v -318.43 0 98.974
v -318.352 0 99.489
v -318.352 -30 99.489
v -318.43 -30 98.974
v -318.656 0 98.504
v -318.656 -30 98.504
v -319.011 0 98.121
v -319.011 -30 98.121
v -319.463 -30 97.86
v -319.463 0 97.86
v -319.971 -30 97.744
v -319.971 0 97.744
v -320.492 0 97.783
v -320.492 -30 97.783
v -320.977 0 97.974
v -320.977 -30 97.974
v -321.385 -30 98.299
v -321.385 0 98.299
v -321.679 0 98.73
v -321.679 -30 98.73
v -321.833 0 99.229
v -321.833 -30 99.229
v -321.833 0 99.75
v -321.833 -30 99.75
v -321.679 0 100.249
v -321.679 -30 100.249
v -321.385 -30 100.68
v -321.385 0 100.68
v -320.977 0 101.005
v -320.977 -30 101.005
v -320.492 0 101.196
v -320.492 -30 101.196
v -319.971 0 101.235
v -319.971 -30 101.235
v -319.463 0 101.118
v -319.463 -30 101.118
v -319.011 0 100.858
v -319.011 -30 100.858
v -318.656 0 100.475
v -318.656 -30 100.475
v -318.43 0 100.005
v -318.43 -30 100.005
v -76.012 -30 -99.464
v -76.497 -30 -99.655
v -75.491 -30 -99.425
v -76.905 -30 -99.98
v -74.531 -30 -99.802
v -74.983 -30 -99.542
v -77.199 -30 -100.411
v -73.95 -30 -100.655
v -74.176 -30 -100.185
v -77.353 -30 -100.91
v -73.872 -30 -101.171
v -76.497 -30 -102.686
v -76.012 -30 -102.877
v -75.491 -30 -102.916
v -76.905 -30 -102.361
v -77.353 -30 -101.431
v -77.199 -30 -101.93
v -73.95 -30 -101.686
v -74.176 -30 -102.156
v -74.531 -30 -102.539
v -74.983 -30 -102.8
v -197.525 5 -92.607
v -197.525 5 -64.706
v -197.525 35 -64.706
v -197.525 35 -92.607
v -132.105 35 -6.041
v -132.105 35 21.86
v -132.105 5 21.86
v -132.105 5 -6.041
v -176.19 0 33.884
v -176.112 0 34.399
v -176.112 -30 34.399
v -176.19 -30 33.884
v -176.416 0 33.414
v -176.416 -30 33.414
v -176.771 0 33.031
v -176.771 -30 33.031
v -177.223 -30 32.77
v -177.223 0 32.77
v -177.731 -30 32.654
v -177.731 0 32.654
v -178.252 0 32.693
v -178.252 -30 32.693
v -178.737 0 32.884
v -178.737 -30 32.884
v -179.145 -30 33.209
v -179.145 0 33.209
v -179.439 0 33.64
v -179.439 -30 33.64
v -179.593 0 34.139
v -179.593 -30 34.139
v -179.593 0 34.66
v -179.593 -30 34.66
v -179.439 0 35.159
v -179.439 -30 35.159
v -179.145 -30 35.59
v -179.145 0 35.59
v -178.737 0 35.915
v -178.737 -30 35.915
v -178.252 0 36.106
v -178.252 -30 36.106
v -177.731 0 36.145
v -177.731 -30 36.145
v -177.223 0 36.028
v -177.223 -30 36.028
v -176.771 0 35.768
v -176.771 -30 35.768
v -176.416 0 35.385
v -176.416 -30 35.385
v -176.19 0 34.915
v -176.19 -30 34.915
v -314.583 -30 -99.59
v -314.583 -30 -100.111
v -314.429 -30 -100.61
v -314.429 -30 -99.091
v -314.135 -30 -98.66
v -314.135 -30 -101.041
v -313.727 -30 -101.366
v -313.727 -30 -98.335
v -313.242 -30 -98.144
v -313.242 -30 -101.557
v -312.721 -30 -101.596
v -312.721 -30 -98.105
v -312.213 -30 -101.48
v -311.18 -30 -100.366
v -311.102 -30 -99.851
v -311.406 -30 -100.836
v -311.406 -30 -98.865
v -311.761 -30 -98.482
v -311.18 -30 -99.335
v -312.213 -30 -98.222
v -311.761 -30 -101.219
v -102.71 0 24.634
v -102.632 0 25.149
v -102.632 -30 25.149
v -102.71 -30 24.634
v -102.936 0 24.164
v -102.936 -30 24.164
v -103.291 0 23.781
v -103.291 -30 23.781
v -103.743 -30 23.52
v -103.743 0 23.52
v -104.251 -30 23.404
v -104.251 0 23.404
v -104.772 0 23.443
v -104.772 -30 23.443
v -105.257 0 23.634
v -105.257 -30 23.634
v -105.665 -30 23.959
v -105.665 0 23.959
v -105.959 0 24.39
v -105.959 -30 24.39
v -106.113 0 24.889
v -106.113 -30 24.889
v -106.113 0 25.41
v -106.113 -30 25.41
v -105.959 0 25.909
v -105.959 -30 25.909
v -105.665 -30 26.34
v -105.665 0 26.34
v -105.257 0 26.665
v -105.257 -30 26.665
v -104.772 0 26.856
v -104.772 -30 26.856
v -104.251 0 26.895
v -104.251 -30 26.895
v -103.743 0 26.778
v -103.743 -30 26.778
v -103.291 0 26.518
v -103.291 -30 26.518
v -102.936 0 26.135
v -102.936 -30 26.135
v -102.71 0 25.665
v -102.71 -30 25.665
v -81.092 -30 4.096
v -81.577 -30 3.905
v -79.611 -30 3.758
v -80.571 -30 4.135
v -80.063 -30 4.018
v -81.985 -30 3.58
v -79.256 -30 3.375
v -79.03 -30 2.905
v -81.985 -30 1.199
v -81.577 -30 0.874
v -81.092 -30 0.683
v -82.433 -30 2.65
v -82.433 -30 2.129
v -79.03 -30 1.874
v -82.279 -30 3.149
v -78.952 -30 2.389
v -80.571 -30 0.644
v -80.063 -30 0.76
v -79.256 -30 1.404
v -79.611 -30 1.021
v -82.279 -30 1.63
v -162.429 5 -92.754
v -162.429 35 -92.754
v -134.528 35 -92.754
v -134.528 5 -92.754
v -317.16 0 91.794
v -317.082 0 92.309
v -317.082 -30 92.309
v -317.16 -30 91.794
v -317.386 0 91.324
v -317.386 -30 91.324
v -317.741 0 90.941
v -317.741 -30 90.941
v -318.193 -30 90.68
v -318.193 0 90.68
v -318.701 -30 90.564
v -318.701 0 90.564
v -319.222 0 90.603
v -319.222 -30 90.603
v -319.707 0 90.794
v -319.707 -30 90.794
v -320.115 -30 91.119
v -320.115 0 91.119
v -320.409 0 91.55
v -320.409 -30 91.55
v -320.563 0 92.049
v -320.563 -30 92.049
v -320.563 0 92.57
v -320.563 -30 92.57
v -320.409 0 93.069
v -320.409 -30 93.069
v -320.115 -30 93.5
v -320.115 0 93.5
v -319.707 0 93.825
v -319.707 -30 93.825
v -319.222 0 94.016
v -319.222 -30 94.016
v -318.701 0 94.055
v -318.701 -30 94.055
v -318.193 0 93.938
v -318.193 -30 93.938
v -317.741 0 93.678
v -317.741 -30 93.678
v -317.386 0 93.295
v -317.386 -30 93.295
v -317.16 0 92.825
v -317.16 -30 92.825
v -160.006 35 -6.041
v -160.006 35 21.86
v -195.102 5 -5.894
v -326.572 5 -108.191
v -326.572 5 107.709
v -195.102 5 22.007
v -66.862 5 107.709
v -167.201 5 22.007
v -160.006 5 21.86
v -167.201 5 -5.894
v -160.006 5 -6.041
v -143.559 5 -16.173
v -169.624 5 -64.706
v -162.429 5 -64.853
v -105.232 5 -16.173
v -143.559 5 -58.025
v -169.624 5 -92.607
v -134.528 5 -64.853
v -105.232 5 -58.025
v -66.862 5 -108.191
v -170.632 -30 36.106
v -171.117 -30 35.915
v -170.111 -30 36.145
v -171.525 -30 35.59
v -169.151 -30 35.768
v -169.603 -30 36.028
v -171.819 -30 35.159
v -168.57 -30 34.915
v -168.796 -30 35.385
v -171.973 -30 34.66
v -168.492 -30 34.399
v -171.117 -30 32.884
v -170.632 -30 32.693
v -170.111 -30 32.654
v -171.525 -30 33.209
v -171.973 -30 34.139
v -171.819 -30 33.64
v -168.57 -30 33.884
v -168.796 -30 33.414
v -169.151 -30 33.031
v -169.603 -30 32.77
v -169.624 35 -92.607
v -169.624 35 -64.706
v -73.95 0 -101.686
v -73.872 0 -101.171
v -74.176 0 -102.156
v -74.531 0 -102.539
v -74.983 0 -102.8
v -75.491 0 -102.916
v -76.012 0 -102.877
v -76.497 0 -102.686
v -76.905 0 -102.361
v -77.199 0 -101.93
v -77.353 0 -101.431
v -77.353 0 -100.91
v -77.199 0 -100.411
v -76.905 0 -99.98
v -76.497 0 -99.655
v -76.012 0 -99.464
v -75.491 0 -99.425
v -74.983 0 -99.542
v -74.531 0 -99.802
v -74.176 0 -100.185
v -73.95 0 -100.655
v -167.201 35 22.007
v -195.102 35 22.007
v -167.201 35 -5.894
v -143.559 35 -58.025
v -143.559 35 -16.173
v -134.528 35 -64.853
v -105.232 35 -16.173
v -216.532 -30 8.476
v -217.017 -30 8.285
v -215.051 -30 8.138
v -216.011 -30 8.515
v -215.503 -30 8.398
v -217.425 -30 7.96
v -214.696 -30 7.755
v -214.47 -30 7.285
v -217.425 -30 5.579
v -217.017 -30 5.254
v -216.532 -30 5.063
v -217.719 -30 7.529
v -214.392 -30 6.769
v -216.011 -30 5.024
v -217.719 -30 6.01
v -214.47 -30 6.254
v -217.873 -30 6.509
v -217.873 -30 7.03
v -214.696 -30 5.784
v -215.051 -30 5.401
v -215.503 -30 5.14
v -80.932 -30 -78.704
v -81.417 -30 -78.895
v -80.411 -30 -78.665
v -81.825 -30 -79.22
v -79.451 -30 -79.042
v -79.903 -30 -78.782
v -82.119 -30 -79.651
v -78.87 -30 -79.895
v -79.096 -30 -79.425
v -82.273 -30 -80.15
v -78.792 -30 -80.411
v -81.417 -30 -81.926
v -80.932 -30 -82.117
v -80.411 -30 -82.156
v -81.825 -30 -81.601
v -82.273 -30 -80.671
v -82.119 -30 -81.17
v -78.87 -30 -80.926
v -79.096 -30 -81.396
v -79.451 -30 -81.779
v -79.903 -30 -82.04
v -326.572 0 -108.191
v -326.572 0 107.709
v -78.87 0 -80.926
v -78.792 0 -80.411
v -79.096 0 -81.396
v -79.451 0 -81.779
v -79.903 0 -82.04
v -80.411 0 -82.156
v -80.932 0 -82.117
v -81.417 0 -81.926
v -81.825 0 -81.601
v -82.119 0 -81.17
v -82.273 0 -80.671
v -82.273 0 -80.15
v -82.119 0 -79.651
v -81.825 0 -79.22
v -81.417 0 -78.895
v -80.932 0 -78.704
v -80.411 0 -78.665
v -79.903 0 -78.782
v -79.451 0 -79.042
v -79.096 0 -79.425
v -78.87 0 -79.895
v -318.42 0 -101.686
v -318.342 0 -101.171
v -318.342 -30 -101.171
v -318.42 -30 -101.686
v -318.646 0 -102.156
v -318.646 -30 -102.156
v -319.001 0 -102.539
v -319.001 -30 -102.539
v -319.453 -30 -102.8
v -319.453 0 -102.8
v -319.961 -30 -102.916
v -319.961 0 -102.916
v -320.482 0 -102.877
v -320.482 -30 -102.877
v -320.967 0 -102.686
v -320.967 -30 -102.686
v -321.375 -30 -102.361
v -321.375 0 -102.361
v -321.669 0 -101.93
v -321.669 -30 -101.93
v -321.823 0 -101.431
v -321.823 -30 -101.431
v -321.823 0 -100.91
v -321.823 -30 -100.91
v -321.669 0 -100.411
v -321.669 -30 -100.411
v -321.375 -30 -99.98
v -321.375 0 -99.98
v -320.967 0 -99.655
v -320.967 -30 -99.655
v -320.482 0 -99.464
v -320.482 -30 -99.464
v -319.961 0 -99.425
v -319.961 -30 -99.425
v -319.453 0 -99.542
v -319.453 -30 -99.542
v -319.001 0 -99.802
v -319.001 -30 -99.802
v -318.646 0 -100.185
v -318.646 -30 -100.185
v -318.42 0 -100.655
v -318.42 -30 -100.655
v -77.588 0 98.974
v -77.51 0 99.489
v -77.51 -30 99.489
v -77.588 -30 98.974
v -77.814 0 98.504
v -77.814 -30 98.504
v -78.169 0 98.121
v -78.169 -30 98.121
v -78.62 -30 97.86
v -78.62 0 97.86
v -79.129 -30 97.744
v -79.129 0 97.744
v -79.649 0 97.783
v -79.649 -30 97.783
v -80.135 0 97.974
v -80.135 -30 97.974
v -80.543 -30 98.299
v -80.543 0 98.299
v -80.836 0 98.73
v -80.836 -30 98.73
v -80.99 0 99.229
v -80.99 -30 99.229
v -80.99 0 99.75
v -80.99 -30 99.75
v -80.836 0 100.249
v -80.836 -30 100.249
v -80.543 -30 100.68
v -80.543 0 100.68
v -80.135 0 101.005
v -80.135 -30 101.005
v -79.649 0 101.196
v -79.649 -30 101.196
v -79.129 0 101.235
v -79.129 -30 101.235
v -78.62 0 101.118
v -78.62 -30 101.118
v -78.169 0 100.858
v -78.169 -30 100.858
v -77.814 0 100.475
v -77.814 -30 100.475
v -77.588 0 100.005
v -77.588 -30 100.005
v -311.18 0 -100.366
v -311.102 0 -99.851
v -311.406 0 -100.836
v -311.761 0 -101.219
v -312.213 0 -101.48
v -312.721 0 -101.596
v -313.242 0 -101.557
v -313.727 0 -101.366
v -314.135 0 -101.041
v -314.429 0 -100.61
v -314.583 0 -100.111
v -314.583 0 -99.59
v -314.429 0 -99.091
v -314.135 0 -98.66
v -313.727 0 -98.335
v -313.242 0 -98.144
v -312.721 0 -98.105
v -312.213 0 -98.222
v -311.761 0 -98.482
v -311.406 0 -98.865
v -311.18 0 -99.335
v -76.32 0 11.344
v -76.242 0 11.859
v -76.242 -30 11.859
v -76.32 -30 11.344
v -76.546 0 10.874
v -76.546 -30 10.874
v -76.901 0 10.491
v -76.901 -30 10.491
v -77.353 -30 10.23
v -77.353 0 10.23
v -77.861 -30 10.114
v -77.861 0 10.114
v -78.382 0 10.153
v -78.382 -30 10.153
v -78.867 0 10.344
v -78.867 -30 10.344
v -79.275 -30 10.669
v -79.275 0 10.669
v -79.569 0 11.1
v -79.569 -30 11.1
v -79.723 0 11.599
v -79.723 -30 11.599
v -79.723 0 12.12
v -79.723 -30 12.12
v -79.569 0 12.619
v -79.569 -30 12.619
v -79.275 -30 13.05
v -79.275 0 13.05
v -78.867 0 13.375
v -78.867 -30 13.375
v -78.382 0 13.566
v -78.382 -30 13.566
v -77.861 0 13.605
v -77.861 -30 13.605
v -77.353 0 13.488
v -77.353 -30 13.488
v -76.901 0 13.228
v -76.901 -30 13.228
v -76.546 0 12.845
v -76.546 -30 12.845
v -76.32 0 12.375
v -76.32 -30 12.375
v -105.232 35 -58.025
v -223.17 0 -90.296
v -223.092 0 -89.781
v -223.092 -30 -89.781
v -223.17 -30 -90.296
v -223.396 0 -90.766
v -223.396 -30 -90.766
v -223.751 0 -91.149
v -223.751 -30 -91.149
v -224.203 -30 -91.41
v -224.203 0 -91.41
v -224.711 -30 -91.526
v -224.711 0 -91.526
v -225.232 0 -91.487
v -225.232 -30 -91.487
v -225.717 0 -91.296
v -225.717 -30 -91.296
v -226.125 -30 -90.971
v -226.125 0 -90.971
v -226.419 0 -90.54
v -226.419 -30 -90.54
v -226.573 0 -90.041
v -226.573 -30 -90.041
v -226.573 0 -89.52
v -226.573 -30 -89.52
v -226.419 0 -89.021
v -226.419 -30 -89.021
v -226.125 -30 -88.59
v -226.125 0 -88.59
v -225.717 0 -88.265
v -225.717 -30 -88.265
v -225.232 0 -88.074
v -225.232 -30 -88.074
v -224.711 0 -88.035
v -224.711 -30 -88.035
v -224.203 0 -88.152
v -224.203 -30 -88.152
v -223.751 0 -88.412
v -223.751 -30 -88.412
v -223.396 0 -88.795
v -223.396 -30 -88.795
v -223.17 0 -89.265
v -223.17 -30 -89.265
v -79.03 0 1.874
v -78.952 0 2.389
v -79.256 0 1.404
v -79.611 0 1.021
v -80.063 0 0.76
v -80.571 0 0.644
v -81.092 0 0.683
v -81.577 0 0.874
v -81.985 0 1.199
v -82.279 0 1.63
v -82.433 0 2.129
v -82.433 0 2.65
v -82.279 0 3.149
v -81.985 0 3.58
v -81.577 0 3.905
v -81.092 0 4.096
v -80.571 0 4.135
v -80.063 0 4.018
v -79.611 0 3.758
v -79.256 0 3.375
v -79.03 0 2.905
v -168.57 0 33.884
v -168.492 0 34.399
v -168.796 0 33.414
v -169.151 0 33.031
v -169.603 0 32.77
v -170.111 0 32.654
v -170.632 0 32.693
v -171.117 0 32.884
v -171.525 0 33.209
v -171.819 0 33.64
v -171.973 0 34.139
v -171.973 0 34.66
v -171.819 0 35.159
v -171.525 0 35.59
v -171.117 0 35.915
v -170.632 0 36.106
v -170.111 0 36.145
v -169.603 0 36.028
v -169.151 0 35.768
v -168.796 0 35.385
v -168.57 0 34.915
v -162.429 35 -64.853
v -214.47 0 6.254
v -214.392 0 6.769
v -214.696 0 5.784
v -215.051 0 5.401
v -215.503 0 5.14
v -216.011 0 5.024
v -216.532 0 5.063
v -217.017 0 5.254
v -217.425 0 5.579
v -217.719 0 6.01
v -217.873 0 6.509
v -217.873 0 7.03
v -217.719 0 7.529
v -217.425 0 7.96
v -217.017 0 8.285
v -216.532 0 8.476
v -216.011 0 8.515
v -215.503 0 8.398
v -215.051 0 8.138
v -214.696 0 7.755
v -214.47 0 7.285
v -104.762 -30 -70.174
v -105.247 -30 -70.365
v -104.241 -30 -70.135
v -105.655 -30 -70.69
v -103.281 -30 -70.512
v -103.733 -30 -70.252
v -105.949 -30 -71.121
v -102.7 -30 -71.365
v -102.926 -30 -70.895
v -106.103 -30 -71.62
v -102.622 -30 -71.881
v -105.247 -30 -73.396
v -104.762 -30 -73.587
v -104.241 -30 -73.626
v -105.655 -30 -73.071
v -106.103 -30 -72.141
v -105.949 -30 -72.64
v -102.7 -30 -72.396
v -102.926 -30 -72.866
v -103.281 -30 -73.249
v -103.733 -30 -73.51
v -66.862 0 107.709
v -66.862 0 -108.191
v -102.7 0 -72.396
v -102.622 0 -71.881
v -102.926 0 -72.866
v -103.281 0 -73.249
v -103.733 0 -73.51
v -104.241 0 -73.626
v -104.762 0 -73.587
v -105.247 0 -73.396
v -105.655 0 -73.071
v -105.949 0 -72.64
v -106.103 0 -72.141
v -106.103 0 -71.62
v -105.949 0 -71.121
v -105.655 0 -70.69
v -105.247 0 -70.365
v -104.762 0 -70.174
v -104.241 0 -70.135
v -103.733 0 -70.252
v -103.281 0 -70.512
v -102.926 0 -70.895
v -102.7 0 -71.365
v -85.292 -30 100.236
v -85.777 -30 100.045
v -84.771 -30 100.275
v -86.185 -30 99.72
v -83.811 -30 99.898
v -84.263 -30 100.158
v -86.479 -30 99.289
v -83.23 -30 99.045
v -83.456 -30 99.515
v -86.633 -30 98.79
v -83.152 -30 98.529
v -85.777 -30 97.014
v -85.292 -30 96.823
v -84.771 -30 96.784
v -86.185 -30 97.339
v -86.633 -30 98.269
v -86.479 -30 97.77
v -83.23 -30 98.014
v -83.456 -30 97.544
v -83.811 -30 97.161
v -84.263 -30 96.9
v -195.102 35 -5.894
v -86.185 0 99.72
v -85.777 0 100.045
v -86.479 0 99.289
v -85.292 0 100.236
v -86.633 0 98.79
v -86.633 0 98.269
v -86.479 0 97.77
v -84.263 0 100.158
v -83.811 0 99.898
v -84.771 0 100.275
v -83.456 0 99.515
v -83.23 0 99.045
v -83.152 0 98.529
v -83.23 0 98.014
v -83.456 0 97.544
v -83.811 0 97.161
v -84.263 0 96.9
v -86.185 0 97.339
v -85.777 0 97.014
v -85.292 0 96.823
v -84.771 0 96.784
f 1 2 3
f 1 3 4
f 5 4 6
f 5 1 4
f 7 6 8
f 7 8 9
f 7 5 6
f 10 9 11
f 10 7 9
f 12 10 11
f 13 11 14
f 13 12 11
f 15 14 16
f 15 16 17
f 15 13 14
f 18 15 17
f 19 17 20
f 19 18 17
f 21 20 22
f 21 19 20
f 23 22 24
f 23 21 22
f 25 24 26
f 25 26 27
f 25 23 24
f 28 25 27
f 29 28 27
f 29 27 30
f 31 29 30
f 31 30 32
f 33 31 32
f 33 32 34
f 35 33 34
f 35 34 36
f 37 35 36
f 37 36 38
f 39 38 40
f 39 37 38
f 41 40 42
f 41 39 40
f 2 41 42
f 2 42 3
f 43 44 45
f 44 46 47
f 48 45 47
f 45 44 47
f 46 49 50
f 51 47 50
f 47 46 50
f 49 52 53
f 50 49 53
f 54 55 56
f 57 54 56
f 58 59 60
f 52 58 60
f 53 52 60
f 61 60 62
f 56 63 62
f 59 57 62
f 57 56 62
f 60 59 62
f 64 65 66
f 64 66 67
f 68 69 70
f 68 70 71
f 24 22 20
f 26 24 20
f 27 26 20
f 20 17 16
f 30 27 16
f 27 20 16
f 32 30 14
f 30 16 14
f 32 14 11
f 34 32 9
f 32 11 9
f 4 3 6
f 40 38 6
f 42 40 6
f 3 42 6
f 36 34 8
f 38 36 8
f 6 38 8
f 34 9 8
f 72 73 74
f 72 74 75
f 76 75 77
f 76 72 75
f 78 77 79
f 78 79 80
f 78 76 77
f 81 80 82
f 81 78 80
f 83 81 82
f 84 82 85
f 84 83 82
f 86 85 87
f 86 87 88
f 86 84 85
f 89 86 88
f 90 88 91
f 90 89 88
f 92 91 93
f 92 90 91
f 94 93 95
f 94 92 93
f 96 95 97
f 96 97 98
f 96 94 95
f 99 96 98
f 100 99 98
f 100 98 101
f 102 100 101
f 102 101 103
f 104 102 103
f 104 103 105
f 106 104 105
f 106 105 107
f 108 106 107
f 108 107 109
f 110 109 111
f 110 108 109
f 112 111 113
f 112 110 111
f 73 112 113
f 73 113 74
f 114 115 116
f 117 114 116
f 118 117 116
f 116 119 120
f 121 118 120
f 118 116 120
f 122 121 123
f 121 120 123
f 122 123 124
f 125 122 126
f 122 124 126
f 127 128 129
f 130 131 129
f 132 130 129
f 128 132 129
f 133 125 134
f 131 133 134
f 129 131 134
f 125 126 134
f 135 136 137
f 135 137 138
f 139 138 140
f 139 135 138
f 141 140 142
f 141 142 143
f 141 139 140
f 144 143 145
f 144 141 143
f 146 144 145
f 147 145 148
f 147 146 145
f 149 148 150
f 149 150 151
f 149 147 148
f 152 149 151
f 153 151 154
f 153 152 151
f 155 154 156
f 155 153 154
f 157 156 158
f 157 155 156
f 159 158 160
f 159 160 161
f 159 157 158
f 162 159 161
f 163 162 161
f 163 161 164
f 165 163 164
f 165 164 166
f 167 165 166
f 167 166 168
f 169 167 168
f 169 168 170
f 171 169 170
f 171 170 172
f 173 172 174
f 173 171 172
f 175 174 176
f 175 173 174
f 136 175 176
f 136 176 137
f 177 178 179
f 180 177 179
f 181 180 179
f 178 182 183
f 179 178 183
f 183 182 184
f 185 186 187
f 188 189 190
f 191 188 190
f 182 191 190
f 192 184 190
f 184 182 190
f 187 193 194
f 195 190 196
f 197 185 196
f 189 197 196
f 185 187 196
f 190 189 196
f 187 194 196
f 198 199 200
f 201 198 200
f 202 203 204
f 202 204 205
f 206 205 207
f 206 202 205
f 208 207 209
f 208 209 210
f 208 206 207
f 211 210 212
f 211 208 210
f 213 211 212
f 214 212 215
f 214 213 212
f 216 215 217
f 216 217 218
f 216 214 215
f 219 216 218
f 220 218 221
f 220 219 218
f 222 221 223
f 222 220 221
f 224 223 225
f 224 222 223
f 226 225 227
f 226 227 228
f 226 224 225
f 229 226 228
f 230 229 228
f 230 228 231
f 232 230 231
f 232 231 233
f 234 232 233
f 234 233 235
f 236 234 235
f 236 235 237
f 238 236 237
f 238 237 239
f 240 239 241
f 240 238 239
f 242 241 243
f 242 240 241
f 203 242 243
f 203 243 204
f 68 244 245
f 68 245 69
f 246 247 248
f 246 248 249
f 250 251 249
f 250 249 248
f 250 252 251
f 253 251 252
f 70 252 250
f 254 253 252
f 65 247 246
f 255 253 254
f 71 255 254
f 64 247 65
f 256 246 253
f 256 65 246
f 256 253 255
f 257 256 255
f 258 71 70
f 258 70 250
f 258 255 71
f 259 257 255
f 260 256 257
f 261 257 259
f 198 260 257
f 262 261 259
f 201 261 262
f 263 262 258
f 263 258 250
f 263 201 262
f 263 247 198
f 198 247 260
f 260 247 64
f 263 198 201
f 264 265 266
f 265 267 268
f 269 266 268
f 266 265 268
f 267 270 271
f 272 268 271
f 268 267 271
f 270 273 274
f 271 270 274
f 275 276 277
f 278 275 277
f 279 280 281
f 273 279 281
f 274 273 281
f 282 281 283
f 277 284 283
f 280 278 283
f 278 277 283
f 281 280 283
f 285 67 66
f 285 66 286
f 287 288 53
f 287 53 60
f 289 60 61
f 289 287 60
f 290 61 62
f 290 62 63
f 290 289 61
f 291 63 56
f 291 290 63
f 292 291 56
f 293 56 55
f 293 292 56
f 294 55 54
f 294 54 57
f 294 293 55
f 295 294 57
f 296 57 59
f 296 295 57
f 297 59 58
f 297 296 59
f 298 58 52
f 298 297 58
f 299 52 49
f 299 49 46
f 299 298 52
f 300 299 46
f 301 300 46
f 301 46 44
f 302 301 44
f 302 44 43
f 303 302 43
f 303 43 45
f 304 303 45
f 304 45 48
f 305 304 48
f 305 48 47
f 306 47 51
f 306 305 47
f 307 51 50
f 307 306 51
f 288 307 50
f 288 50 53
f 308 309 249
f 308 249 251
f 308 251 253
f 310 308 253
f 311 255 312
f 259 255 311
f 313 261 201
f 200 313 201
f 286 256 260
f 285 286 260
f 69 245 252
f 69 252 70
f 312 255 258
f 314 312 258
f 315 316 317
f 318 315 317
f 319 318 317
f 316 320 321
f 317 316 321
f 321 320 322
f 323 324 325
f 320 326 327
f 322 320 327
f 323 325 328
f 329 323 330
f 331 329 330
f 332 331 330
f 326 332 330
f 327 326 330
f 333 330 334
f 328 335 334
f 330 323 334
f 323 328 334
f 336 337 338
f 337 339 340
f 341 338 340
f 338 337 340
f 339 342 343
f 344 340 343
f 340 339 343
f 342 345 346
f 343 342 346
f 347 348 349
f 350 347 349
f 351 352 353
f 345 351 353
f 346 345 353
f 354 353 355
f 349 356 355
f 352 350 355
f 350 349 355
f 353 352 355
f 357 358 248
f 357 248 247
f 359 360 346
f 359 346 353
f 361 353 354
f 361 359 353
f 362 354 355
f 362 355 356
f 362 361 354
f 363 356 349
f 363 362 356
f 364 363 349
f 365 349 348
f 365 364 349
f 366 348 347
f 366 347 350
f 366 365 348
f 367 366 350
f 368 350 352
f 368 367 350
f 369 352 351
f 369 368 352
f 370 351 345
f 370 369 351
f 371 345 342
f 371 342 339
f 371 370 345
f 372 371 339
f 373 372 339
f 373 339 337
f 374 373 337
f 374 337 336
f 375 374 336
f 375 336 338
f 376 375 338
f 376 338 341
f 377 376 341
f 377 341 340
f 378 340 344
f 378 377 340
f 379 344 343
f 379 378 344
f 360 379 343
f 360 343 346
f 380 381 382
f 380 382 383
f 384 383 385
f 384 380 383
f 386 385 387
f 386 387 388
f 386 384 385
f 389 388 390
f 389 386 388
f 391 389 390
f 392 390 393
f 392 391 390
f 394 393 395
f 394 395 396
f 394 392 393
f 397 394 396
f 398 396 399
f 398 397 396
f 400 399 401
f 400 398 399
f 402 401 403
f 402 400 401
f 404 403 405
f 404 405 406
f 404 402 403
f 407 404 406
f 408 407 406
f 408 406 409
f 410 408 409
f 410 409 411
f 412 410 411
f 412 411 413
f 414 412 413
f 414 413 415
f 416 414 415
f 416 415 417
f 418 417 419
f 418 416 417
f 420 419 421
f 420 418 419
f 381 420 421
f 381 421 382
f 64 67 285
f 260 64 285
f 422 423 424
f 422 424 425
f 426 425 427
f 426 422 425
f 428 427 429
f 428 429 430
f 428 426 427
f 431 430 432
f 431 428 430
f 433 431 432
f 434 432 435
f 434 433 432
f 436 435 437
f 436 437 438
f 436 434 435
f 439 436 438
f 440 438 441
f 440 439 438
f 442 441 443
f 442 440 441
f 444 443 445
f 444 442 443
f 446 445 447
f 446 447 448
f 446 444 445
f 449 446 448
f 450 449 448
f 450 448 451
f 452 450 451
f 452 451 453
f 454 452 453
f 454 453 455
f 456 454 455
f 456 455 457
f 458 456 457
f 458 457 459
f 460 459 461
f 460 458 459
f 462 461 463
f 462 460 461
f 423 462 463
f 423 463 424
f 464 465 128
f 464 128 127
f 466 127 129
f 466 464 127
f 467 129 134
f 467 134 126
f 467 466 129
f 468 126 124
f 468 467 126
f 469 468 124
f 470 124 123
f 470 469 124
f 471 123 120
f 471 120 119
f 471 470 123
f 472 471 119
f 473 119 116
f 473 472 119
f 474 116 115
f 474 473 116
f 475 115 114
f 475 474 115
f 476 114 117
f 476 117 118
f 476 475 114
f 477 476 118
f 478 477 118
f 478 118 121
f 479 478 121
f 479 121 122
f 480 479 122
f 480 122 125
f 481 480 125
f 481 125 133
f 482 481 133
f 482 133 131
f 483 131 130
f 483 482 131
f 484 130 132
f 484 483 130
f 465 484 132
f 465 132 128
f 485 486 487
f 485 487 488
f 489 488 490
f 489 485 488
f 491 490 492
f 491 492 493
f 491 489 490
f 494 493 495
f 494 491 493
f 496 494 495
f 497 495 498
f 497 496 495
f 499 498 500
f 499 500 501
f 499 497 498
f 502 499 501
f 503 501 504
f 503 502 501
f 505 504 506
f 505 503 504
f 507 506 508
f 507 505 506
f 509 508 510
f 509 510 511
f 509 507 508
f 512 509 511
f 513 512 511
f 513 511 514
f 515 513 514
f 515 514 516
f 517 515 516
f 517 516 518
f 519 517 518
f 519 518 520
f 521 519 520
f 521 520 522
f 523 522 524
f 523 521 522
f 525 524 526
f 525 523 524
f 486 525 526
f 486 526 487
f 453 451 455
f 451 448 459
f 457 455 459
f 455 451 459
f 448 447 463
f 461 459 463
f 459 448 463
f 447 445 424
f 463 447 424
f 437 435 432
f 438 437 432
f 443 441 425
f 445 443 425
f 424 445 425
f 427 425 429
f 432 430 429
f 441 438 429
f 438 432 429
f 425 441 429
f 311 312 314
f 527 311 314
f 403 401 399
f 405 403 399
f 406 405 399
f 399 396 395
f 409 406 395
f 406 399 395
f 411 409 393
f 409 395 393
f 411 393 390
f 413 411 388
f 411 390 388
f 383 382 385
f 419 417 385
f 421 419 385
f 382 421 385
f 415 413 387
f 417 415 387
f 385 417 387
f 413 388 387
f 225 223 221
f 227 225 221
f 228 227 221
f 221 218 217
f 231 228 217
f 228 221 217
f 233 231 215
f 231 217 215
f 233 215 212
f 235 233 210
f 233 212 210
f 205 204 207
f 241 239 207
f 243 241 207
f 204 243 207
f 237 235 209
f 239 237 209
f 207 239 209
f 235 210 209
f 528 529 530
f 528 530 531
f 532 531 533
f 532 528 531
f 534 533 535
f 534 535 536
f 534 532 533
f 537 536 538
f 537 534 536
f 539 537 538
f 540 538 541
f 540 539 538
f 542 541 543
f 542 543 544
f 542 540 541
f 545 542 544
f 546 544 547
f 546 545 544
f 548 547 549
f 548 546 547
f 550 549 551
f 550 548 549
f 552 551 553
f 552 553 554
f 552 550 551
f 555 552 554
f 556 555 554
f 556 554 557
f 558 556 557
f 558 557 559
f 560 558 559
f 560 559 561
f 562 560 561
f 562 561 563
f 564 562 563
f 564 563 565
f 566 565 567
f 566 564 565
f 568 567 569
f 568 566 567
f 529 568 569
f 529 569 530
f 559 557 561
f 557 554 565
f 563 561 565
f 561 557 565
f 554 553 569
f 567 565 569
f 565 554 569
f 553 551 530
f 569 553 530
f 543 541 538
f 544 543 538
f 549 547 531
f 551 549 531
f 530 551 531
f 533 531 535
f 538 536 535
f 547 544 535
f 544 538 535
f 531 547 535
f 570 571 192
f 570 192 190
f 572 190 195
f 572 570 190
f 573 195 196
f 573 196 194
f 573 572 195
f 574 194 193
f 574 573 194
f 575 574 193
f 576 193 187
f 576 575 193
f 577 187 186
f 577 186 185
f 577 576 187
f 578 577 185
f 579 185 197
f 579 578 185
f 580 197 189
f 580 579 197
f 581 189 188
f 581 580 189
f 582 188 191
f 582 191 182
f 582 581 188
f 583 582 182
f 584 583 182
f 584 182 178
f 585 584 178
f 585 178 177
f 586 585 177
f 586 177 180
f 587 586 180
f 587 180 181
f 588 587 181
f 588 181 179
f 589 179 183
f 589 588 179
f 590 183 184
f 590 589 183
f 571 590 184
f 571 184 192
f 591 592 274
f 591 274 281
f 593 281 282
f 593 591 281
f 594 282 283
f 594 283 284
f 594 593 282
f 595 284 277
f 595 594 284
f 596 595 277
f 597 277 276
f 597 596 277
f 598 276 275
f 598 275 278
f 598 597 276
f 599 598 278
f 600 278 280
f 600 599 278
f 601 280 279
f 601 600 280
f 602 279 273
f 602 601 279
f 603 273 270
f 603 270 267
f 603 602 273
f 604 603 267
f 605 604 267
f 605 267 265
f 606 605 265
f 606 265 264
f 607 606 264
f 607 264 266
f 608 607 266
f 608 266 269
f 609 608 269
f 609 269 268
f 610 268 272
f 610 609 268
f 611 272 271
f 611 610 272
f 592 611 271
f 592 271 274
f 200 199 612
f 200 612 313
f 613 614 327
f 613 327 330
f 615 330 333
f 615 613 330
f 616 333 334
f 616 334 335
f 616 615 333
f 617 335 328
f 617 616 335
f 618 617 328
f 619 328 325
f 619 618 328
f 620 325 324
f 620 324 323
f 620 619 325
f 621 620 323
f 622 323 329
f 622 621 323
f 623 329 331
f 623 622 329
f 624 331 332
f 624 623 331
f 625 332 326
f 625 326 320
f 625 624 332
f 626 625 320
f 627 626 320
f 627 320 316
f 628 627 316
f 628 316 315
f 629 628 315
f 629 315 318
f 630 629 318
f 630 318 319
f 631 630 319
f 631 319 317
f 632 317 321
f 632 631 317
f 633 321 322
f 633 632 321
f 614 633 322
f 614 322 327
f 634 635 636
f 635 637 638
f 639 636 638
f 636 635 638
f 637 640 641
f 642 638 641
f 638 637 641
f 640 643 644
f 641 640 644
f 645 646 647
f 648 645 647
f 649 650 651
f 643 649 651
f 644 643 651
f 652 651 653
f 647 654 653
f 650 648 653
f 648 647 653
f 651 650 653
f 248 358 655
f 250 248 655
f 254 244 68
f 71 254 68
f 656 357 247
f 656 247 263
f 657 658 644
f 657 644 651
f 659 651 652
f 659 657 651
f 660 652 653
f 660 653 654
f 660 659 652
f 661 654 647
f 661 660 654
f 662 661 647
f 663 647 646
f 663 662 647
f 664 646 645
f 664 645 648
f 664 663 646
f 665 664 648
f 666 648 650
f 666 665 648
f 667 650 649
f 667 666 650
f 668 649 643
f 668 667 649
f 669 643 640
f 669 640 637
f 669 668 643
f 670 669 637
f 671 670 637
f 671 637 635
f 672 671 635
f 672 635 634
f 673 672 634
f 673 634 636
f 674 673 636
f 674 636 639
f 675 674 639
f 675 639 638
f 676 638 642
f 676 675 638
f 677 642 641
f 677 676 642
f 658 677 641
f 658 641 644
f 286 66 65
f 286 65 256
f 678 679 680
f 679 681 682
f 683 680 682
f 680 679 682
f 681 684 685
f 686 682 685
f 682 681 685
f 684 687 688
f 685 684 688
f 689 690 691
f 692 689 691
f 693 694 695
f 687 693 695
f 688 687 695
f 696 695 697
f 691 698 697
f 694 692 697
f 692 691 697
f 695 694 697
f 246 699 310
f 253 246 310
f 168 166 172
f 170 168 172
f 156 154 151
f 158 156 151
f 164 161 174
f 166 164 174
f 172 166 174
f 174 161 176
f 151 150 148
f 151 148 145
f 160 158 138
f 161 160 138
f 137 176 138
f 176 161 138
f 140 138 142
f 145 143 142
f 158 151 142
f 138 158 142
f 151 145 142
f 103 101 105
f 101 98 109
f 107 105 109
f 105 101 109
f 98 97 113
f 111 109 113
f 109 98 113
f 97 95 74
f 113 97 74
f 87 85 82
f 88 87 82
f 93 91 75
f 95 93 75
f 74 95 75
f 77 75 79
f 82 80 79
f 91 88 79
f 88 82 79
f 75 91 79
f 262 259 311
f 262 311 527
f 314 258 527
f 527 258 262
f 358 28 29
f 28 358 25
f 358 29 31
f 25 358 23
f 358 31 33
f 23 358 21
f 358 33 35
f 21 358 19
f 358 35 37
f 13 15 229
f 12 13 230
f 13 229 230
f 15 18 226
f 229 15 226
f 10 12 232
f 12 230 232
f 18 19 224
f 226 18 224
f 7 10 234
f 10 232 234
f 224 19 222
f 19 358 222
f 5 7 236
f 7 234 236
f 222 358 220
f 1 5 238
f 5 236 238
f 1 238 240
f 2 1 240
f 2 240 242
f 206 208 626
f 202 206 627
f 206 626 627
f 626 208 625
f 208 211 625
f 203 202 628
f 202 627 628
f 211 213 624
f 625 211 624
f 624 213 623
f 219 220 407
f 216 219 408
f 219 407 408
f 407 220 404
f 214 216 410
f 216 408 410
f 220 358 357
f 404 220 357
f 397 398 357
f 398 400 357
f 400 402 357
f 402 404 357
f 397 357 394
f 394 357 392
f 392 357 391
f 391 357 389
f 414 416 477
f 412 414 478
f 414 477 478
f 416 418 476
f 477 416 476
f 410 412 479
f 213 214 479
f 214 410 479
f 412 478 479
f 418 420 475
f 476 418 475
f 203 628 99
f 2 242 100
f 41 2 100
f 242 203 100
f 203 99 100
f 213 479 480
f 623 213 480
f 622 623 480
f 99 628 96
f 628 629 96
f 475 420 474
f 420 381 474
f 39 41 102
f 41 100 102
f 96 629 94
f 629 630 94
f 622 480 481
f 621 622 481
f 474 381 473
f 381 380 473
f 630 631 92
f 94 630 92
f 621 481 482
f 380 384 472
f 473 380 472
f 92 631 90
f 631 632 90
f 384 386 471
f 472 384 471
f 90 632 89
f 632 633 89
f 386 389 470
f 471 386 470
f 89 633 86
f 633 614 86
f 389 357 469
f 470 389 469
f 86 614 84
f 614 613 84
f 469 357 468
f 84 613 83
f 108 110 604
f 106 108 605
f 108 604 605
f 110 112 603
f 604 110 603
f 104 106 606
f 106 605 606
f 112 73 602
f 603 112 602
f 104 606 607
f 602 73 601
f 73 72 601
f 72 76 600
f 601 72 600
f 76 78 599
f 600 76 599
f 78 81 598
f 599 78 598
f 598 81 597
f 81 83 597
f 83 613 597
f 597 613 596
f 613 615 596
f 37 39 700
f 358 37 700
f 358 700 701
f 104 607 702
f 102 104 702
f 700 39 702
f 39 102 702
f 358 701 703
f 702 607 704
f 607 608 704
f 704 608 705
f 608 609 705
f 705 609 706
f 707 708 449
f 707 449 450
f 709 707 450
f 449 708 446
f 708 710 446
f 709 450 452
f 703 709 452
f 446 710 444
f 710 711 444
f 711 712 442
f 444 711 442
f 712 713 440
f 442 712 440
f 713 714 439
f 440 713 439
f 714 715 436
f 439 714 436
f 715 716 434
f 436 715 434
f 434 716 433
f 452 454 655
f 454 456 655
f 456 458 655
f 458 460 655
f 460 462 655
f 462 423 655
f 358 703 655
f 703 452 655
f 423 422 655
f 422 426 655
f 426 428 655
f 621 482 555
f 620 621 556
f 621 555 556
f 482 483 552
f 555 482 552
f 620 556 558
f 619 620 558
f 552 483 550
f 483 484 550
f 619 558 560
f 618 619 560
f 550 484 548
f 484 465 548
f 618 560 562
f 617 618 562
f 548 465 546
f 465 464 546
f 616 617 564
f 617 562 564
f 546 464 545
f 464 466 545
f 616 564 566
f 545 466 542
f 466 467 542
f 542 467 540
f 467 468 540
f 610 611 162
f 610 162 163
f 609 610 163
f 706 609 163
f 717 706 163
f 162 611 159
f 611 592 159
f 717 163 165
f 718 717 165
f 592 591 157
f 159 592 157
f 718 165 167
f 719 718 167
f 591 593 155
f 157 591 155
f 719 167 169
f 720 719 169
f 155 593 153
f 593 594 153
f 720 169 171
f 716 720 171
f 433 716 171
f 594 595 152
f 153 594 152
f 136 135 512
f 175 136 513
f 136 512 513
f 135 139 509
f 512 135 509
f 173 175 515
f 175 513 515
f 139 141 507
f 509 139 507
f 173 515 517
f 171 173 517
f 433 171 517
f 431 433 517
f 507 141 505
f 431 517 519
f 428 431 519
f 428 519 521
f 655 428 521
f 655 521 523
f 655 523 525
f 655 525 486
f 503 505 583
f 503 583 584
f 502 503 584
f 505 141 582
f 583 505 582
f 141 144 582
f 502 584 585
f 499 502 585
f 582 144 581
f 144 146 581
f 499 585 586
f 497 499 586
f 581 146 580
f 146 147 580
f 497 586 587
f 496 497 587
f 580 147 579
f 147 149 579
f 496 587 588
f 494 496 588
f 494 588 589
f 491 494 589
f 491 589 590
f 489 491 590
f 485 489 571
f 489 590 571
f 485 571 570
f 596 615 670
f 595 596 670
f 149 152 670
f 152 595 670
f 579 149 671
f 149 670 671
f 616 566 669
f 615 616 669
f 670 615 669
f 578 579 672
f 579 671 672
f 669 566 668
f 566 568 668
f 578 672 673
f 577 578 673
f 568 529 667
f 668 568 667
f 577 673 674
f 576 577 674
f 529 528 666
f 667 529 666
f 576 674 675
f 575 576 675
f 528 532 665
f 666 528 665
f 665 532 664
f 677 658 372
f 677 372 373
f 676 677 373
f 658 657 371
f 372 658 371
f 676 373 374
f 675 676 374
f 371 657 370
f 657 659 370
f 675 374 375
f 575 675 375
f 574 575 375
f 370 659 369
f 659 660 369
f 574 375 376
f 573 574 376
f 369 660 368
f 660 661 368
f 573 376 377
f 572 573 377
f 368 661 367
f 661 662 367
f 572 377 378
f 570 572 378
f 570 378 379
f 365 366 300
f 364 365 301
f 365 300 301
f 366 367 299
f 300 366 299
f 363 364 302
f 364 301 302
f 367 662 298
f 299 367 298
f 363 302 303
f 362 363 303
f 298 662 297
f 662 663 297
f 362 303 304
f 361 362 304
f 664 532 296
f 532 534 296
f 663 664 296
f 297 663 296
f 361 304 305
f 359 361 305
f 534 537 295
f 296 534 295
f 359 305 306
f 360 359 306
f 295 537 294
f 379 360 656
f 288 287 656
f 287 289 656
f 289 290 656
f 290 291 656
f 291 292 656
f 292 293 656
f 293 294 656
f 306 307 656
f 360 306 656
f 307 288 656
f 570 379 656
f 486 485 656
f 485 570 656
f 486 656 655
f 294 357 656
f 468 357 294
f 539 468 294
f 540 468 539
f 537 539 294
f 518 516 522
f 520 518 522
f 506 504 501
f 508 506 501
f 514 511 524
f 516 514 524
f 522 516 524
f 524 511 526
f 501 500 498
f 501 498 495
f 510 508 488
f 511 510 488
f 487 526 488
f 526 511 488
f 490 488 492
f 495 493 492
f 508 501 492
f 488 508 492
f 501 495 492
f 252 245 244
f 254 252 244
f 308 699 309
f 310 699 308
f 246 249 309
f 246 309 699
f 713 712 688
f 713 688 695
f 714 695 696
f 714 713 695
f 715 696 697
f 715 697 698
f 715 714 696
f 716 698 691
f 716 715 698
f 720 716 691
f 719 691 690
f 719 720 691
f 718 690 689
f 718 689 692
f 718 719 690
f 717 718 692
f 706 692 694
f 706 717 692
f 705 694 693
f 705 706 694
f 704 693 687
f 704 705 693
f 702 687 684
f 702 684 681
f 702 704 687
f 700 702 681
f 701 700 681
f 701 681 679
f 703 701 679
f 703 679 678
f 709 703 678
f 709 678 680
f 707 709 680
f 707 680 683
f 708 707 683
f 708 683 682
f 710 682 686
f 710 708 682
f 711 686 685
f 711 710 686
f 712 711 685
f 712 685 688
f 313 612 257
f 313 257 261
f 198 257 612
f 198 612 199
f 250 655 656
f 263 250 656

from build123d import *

# Parameters (mm, degrees)
SKETCH2_W           = 259.71
SKETCH2_H           = 215.9
BOSS_EXTRUDE1_DEPTH = 5
SKETCH1_R           = 1.75
BOSS_EXTRUDE2_DEPTH = 30
FANS_W              = 27.900833557
FANS_H              = 27.900833558
FANS_W_2            = 38.326934518
FANS_H_2            = 41.851250335
FANS_H_3            = 27.900833557
BOSS_EXTRUDE3_DEPTH = 30


with BuildPart() as part:
    # Sketch2 → Boss-Extrude1 (new body)
    with BuildSketch(Plane(origin=(0, 0, 0), x_dir=(1, 0, 0), z_dir=(0, 1, 0))):
        with Locations((-196.717193813, 0.240534117)):
            Rectangle(SKETCH2_W, SKETCH2_H)
    extrude(amount=BOSS_EXTRUDE1_DEPTH)

    # Sketch1 → Boss-Extrude2 (add)
    with BuildSketch(Plane(origin=(0, 0, 0), x_dir=(1, 0, 0), z_dir=(0, 1, 0))):
        with Locations((-320.092193813, 101.170534117)):
            Circle(SKETCH1_R)
        with Locations((-312.852193813, 99.850534117)):
            Circle(SKETCH1_R)
        with Locations((-318.832193813, -92.309465883)):
            Circle(SKETCH1_R)
        with Locations((-320.102193813, -99.489465883)):
            Circle(SKETCH1_R)
        with Locations((-177.862193813, -34.399465883)):
            Circle(SKETCH1_R)
        with Locations((-170.242193813, -34.399465883)):
            Circle(SKETCH1_R)
        with Locations((-104.382193813, -25.149465883)):
            Circle(SKETCH1_R)
        with Locations((-216.142193813, -6.769465883)):
            Circle(SKETCH1_R)
        with Locations((-77.992193813, -11.859465883)):
            Circle(SKETCH1_R)
        with Locations((-80.702193813, -2.389465883)):
            Circle(SKETCH1_R)
        with Locations((-84.902193813, -98.529465883)):
            Circle(SKETCH1_R)
        with Locations((-79.259756914, -99.489465883)):
            Circle(SKETCH1_R)
        with Locations((-104.372193813, 71.880534117)):
            Circle(SKETCH1_R)
        with Locations((-80.542193813, 80.410534117)):
            Circle(SKETCH1_R)
        with Locations((-75.622193813, 101.170534117)):
            Circle(SKETCH1_R)
        with Locations((-224.842193813, 89.780534117)):
            Circle(SKETCH1_R)
    extrude(amount=-BOSS_EXTRUDE2_DEPTH)

    # fans → Boss-Extrude3 (add)
    with BuildSketch(Plane(origin=(0, 5, 0), x_dir=(1, 0, 0), z_dir=(0, 1, 0))):
        with Locations((-146.055153933, -7.909446212)):
            Rectangle(FANS_W, FANS_H)
        with Locations((-124.395296303, 37.09900371)):
            Rectangle(FANS_W_2, FANS_H_2)
        with Locations((-181.151465618, -8.056292705)):
            Rectangle(FANS_W, FANS_H_3)
        with Locations((-148.478121058, 78.803407554)):
            Rectangle(FANS_W, FANS_H_3)
        with Locations((-183.574432743, 78.656561061)):
            Rectangle(FANS_W, FANS_H_3)
    extrude(amount=BOSS_EXTRUDE3_DEPTH)


solid = part.part
